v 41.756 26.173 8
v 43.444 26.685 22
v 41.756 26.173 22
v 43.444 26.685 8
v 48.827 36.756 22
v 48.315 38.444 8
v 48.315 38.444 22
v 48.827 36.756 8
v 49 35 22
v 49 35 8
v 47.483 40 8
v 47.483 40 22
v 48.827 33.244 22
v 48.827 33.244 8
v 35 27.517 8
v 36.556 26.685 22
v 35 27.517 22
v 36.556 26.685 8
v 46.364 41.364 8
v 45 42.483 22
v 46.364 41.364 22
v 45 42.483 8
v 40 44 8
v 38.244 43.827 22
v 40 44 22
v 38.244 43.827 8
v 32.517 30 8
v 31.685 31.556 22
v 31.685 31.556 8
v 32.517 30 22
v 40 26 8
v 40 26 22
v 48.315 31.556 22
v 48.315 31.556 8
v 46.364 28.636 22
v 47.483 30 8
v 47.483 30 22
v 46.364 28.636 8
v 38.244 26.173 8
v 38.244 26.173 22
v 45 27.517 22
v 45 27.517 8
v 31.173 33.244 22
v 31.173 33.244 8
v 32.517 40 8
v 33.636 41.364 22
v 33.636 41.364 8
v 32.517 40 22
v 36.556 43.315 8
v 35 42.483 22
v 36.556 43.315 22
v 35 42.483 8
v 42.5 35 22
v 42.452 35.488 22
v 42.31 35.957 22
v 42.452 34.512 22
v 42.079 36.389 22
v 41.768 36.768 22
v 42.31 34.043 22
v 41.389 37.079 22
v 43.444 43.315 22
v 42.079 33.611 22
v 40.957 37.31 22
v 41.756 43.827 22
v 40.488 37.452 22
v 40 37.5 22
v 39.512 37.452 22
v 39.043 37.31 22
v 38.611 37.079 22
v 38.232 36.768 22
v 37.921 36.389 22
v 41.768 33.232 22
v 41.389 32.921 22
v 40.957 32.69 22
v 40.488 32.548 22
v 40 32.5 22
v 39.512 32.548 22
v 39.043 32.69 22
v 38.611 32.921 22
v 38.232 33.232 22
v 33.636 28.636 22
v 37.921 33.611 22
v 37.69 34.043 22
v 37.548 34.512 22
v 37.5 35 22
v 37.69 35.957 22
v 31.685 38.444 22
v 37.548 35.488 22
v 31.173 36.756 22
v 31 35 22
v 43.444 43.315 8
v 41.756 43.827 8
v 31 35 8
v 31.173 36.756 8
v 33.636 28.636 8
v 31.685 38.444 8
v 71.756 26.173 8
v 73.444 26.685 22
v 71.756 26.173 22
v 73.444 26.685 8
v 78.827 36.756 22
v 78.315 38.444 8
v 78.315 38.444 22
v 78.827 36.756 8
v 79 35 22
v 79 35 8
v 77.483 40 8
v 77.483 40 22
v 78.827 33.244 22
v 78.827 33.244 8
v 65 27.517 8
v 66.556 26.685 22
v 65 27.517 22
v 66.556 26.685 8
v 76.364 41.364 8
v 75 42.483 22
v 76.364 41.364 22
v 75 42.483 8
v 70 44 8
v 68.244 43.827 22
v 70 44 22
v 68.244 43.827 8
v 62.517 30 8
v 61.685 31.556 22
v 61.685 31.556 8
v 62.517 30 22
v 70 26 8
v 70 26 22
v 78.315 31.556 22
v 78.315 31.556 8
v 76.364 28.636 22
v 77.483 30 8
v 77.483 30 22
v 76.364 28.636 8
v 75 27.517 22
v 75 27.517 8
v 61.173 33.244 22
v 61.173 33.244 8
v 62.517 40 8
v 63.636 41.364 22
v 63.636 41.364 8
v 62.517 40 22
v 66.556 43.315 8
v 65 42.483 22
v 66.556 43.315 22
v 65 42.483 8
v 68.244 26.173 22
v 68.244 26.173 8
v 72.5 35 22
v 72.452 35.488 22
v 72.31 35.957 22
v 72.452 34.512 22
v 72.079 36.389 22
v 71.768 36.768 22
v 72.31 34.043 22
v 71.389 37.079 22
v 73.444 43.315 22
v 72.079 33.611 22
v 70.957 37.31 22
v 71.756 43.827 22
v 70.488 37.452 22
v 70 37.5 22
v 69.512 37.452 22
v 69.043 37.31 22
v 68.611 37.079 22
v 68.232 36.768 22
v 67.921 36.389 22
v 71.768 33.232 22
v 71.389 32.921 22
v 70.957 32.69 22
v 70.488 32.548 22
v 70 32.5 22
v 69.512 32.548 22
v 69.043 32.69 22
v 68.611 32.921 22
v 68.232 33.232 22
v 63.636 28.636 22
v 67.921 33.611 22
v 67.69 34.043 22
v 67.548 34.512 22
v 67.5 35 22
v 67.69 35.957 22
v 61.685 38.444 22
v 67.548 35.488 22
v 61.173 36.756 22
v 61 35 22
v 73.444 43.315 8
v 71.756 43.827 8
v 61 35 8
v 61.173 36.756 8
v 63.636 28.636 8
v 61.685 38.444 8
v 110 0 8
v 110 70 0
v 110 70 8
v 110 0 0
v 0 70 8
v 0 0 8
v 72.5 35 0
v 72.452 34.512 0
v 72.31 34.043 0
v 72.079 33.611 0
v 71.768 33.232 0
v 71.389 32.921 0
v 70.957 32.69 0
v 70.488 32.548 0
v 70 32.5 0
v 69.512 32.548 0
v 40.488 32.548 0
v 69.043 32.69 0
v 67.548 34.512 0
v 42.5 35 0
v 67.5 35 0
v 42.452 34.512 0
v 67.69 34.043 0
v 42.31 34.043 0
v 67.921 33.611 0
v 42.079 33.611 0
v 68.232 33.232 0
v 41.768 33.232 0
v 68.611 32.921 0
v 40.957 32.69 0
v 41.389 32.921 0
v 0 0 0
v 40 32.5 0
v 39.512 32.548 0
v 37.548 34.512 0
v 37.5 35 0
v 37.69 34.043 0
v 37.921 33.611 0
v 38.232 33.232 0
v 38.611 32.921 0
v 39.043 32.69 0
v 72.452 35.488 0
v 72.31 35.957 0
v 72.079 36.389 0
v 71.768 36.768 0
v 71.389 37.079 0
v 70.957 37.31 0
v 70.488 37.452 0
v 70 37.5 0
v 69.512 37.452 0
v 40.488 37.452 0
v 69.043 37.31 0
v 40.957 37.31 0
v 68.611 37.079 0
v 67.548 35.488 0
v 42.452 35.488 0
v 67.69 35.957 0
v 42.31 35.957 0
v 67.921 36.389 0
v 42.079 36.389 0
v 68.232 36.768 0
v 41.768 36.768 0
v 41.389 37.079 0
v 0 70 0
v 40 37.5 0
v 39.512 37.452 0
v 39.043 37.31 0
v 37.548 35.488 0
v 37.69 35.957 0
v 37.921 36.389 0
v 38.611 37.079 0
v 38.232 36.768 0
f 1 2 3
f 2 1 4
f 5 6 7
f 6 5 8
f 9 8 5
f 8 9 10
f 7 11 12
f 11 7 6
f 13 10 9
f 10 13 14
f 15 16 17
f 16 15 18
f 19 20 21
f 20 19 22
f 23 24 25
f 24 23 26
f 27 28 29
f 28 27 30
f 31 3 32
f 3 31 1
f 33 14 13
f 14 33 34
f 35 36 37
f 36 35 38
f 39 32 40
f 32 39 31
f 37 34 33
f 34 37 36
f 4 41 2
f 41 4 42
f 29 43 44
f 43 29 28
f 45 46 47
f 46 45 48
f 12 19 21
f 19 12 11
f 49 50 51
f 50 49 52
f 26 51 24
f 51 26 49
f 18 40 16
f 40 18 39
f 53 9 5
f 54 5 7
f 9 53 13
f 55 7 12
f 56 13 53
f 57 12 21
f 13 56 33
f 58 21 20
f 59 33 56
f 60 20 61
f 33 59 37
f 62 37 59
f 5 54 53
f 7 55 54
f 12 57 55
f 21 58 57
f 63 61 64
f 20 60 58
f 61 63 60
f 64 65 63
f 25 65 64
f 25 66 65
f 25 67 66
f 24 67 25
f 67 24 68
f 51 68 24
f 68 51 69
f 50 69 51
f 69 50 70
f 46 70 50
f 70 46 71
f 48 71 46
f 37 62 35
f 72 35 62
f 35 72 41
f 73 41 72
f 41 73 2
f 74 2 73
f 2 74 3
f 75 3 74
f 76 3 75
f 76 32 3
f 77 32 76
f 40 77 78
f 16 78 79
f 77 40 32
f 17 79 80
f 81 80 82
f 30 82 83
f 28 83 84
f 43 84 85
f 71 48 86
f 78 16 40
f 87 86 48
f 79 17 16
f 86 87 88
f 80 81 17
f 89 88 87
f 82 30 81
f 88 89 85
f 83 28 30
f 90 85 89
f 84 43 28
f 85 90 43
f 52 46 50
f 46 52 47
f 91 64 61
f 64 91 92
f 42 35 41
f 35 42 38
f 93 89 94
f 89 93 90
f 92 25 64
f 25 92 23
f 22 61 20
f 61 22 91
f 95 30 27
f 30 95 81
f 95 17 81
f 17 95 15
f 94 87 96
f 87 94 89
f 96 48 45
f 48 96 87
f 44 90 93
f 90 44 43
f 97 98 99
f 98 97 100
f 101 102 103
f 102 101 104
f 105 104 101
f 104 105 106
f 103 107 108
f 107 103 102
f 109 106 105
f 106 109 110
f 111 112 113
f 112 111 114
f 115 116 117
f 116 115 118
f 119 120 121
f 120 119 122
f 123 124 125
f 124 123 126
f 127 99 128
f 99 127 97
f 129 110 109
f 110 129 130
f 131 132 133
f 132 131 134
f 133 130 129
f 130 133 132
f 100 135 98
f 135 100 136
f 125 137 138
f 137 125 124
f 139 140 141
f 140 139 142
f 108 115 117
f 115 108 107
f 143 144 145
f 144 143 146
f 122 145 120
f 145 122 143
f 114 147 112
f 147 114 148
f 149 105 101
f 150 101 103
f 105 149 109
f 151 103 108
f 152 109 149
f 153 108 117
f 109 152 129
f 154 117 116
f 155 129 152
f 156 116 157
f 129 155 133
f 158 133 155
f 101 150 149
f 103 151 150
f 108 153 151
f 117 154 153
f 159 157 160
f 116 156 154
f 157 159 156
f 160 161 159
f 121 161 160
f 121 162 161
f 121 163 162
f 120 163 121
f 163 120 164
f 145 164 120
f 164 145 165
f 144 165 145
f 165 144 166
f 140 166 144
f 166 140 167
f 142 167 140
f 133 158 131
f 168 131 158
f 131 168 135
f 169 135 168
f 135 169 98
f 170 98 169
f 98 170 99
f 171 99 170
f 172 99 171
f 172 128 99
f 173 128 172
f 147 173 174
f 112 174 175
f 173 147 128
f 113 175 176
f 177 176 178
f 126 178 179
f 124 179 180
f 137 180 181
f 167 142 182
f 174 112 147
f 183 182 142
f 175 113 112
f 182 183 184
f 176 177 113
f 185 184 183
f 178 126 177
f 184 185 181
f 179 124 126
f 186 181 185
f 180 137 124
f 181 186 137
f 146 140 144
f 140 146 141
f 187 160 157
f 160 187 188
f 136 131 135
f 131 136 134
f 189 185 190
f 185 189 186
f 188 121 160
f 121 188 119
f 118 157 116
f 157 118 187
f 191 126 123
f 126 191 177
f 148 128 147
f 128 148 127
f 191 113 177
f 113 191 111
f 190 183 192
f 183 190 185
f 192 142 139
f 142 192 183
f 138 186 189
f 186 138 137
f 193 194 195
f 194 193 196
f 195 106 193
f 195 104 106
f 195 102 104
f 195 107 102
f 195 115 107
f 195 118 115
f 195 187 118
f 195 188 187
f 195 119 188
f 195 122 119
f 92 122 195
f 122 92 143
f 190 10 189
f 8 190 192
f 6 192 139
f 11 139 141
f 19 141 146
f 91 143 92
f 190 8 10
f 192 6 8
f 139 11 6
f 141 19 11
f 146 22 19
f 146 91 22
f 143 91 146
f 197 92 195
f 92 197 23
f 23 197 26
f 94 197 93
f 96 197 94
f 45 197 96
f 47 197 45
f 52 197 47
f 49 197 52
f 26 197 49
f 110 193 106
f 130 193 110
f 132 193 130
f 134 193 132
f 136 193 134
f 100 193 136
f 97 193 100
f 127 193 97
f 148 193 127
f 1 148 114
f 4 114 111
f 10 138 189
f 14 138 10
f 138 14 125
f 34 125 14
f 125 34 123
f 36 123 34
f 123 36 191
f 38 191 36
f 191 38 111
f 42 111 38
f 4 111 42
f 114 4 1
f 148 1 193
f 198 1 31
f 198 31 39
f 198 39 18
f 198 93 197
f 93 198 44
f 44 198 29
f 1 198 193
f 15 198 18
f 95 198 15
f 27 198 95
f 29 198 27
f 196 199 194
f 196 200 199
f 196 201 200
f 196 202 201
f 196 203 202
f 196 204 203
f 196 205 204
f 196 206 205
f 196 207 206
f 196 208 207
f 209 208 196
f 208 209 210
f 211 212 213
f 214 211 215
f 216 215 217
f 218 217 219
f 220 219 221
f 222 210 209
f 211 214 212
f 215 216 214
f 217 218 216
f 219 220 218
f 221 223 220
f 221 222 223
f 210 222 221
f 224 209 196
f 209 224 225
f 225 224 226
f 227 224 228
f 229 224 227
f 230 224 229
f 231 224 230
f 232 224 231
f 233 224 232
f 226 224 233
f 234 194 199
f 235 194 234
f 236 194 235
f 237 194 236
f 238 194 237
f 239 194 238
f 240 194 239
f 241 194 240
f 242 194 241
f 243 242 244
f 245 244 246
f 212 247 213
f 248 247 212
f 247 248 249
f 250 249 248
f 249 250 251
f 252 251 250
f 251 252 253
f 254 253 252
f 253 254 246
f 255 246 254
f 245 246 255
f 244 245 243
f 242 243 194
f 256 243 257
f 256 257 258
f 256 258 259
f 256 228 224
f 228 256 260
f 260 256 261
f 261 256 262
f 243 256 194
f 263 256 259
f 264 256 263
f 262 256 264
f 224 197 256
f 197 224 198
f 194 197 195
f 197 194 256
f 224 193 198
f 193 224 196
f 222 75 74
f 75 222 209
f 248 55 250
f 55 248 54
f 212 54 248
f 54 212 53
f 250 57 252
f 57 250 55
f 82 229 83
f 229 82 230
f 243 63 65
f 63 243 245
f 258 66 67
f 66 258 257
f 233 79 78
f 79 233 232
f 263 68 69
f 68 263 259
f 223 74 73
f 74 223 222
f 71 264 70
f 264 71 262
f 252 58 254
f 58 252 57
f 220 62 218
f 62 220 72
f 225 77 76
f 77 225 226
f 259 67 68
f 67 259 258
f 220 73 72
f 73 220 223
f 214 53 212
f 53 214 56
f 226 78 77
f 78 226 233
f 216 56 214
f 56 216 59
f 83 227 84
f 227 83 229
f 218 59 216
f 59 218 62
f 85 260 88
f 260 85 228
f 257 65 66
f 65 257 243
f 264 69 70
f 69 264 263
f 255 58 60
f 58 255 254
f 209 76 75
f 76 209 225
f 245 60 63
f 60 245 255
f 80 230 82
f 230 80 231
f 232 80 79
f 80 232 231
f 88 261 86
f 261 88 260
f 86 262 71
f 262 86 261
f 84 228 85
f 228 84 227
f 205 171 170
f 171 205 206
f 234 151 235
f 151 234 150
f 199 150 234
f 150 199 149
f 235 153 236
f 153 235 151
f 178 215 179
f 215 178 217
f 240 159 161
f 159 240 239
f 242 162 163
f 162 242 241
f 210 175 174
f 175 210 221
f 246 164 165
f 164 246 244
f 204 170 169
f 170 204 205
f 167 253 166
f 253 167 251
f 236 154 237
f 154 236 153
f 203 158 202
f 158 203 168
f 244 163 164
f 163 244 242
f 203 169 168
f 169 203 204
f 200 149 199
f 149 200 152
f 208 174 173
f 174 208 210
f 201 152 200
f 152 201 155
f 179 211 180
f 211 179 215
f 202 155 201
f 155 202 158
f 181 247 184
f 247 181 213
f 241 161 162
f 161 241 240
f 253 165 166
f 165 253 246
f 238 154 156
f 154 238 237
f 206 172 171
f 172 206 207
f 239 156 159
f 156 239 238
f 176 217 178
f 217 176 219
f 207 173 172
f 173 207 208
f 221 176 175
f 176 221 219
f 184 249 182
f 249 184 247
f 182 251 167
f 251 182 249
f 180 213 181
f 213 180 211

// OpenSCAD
$fn = 32;

// ----------------------------------------------------------------------
// Drill jig: two_boss jig
// ----------------------------------------------------------------------

// --- parameters (mm) ---
plate_l = 110;            // plate length, X
plate_w = 70;             // plate width, Y
plate_t = 8;              // plate thickness
boss_d = 18;              // guide boss diameter
boss_h = 15;              // boss height above the plate
guide_d = 5;              // guide hole diameter
boss_pitch = 30;          // boss pitch

n_boss = 2;  // guide bosses
boss_x0 = (plate_l - (n_boss - 1) * boss_pitch) / 2;  // first boss X
boss_top = plate_t - 1 + boss_h;  // boss crown height
total_h = boss_top;  // overall height

difference() {
  union() {
  cube([plate_l, plate_w, plate_t]);
  for (i = [0 : n_boss - 1])
    translate([boss_x0 + i * boss_pitch, plate_w / 2, plate_t - 1])
      cylinder(h = boss_h, d = boss_d);
  }
  for (i = [0 : n_boss - 1])
    translate([boss_x0 + i * boss_pitch, plate_w / 2, -1])
      cylinder(h = plate_t + boss_h, d = guide_d);
}
